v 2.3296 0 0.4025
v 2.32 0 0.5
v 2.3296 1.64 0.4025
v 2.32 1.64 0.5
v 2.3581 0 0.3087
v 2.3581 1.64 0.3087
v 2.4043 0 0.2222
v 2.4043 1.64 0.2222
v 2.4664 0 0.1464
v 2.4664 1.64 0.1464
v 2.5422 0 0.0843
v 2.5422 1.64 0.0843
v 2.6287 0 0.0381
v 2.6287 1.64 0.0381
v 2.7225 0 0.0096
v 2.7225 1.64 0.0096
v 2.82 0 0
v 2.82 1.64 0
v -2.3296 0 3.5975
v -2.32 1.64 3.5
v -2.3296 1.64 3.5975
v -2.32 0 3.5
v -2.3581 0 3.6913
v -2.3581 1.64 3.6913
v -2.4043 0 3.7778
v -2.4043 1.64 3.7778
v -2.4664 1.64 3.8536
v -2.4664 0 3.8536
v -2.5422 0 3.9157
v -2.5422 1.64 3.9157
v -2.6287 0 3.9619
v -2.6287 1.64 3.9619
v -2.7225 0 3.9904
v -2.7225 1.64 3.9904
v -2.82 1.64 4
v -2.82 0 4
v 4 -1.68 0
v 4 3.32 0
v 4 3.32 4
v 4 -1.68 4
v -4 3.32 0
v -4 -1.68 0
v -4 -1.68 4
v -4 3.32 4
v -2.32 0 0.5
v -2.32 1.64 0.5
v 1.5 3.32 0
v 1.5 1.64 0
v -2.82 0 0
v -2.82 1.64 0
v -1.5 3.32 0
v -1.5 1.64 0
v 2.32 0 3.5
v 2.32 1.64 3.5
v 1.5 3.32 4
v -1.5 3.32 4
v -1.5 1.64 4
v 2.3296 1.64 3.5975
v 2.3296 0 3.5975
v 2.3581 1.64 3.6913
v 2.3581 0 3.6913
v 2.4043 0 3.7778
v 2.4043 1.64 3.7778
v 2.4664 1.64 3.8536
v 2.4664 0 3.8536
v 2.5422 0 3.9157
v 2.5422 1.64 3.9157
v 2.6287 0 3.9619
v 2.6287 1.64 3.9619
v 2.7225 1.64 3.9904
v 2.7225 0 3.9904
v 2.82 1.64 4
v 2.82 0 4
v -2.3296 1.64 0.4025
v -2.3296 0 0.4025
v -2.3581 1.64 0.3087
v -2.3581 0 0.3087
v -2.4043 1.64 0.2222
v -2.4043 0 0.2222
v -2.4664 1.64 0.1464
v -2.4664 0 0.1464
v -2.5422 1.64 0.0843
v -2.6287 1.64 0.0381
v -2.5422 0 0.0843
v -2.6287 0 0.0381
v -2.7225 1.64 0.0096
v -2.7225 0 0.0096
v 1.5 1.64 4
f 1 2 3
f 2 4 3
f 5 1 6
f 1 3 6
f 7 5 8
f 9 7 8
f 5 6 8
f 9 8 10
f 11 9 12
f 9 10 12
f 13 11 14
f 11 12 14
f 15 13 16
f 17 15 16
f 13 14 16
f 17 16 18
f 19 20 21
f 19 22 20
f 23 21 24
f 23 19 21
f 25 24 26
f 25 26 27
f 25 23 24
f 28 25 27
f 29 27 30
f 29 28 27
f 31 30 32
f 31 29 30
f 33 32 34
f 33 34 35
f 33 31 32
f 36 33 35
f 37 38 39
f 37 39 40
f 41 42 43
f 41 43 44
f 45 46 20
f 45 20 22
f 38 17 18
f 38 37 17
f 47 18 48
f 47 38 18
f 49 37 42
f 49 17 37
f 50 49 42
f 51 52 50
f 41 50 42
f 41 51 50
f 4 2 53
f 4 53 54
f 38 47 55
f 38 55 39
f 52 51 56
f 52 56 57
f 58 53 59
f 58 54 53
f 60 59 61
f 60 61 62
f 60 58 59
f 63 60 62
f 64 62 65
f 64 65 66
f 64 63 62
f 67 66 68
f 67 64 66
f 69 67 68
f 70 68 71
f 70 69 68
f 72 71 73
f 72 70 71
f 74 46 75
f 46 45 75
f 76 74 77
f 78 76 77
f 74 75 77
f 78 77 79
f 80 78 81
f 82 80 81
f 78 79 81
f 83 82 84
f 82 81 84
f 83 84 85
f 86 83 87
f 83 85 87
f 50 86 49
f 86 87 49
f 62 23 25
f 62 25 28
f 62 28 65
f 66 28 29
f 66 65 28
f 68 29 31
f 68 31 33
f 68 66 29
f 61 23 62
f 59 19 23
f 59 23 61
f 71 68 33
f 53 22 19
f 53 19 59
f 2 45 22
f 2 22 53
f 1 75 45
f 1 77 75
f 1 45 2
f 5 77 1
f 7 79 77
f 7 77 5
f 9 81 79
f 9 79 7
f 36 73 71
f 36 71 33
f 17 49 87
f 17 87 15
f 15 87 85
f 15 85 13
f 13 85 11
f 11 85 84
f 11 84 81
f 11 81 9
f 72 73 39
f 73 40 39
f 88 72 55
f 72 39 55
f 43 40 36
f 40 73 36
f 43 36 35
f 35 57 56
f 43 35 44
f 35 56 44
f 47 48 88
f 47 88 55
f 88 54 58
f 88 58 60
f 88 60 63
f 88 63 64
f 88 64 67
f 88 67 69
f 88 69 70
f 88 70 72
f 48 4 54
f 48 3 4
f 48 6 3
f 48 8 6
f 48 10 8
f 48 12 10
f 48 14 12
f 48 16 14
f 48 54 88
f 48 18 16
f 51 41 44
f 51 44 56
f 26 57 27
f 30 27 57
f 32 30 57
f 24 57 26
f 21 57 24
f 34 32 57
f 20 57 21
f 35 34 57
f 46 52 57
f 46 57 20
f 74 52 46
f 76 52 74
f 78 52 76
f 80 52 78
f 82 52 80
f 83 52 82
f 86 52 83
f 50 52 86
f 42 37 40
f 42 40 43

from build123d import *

# Parameters (mm, degrees)
PAD_DEPTH = 4
FILLET_R  = 0.5


with BuildPart() as part:
    # Sketch → Pad (new body)
    with BuildSketch(Plane.XY):
        Polygon((-2.32, 0), (2.32, 0), (2.32, 1.64), (1.5, 1.64), (1.5, 3.32), (4, 3.32), (4, -1.68), (-4, -1.68), (-4, 3.32), (-1.5, 3.32), (-1.5, 1.64), (-2.32, 1.64), align=None)
    extrude(amount=PAD_DEPTH)

    # Fillet
    fillet_edges = [part.edges().sort_by_distance(p)[0] for p in [
        (2.32, 0.82, 4),
        (-2.32, 0.82, 4),
        (2.32, 0.82, 0),
        (-2.32, 0.82, 0),
    ]]
    fillet(fillet_edges, radius=FILLET_R)


solid = part.part
